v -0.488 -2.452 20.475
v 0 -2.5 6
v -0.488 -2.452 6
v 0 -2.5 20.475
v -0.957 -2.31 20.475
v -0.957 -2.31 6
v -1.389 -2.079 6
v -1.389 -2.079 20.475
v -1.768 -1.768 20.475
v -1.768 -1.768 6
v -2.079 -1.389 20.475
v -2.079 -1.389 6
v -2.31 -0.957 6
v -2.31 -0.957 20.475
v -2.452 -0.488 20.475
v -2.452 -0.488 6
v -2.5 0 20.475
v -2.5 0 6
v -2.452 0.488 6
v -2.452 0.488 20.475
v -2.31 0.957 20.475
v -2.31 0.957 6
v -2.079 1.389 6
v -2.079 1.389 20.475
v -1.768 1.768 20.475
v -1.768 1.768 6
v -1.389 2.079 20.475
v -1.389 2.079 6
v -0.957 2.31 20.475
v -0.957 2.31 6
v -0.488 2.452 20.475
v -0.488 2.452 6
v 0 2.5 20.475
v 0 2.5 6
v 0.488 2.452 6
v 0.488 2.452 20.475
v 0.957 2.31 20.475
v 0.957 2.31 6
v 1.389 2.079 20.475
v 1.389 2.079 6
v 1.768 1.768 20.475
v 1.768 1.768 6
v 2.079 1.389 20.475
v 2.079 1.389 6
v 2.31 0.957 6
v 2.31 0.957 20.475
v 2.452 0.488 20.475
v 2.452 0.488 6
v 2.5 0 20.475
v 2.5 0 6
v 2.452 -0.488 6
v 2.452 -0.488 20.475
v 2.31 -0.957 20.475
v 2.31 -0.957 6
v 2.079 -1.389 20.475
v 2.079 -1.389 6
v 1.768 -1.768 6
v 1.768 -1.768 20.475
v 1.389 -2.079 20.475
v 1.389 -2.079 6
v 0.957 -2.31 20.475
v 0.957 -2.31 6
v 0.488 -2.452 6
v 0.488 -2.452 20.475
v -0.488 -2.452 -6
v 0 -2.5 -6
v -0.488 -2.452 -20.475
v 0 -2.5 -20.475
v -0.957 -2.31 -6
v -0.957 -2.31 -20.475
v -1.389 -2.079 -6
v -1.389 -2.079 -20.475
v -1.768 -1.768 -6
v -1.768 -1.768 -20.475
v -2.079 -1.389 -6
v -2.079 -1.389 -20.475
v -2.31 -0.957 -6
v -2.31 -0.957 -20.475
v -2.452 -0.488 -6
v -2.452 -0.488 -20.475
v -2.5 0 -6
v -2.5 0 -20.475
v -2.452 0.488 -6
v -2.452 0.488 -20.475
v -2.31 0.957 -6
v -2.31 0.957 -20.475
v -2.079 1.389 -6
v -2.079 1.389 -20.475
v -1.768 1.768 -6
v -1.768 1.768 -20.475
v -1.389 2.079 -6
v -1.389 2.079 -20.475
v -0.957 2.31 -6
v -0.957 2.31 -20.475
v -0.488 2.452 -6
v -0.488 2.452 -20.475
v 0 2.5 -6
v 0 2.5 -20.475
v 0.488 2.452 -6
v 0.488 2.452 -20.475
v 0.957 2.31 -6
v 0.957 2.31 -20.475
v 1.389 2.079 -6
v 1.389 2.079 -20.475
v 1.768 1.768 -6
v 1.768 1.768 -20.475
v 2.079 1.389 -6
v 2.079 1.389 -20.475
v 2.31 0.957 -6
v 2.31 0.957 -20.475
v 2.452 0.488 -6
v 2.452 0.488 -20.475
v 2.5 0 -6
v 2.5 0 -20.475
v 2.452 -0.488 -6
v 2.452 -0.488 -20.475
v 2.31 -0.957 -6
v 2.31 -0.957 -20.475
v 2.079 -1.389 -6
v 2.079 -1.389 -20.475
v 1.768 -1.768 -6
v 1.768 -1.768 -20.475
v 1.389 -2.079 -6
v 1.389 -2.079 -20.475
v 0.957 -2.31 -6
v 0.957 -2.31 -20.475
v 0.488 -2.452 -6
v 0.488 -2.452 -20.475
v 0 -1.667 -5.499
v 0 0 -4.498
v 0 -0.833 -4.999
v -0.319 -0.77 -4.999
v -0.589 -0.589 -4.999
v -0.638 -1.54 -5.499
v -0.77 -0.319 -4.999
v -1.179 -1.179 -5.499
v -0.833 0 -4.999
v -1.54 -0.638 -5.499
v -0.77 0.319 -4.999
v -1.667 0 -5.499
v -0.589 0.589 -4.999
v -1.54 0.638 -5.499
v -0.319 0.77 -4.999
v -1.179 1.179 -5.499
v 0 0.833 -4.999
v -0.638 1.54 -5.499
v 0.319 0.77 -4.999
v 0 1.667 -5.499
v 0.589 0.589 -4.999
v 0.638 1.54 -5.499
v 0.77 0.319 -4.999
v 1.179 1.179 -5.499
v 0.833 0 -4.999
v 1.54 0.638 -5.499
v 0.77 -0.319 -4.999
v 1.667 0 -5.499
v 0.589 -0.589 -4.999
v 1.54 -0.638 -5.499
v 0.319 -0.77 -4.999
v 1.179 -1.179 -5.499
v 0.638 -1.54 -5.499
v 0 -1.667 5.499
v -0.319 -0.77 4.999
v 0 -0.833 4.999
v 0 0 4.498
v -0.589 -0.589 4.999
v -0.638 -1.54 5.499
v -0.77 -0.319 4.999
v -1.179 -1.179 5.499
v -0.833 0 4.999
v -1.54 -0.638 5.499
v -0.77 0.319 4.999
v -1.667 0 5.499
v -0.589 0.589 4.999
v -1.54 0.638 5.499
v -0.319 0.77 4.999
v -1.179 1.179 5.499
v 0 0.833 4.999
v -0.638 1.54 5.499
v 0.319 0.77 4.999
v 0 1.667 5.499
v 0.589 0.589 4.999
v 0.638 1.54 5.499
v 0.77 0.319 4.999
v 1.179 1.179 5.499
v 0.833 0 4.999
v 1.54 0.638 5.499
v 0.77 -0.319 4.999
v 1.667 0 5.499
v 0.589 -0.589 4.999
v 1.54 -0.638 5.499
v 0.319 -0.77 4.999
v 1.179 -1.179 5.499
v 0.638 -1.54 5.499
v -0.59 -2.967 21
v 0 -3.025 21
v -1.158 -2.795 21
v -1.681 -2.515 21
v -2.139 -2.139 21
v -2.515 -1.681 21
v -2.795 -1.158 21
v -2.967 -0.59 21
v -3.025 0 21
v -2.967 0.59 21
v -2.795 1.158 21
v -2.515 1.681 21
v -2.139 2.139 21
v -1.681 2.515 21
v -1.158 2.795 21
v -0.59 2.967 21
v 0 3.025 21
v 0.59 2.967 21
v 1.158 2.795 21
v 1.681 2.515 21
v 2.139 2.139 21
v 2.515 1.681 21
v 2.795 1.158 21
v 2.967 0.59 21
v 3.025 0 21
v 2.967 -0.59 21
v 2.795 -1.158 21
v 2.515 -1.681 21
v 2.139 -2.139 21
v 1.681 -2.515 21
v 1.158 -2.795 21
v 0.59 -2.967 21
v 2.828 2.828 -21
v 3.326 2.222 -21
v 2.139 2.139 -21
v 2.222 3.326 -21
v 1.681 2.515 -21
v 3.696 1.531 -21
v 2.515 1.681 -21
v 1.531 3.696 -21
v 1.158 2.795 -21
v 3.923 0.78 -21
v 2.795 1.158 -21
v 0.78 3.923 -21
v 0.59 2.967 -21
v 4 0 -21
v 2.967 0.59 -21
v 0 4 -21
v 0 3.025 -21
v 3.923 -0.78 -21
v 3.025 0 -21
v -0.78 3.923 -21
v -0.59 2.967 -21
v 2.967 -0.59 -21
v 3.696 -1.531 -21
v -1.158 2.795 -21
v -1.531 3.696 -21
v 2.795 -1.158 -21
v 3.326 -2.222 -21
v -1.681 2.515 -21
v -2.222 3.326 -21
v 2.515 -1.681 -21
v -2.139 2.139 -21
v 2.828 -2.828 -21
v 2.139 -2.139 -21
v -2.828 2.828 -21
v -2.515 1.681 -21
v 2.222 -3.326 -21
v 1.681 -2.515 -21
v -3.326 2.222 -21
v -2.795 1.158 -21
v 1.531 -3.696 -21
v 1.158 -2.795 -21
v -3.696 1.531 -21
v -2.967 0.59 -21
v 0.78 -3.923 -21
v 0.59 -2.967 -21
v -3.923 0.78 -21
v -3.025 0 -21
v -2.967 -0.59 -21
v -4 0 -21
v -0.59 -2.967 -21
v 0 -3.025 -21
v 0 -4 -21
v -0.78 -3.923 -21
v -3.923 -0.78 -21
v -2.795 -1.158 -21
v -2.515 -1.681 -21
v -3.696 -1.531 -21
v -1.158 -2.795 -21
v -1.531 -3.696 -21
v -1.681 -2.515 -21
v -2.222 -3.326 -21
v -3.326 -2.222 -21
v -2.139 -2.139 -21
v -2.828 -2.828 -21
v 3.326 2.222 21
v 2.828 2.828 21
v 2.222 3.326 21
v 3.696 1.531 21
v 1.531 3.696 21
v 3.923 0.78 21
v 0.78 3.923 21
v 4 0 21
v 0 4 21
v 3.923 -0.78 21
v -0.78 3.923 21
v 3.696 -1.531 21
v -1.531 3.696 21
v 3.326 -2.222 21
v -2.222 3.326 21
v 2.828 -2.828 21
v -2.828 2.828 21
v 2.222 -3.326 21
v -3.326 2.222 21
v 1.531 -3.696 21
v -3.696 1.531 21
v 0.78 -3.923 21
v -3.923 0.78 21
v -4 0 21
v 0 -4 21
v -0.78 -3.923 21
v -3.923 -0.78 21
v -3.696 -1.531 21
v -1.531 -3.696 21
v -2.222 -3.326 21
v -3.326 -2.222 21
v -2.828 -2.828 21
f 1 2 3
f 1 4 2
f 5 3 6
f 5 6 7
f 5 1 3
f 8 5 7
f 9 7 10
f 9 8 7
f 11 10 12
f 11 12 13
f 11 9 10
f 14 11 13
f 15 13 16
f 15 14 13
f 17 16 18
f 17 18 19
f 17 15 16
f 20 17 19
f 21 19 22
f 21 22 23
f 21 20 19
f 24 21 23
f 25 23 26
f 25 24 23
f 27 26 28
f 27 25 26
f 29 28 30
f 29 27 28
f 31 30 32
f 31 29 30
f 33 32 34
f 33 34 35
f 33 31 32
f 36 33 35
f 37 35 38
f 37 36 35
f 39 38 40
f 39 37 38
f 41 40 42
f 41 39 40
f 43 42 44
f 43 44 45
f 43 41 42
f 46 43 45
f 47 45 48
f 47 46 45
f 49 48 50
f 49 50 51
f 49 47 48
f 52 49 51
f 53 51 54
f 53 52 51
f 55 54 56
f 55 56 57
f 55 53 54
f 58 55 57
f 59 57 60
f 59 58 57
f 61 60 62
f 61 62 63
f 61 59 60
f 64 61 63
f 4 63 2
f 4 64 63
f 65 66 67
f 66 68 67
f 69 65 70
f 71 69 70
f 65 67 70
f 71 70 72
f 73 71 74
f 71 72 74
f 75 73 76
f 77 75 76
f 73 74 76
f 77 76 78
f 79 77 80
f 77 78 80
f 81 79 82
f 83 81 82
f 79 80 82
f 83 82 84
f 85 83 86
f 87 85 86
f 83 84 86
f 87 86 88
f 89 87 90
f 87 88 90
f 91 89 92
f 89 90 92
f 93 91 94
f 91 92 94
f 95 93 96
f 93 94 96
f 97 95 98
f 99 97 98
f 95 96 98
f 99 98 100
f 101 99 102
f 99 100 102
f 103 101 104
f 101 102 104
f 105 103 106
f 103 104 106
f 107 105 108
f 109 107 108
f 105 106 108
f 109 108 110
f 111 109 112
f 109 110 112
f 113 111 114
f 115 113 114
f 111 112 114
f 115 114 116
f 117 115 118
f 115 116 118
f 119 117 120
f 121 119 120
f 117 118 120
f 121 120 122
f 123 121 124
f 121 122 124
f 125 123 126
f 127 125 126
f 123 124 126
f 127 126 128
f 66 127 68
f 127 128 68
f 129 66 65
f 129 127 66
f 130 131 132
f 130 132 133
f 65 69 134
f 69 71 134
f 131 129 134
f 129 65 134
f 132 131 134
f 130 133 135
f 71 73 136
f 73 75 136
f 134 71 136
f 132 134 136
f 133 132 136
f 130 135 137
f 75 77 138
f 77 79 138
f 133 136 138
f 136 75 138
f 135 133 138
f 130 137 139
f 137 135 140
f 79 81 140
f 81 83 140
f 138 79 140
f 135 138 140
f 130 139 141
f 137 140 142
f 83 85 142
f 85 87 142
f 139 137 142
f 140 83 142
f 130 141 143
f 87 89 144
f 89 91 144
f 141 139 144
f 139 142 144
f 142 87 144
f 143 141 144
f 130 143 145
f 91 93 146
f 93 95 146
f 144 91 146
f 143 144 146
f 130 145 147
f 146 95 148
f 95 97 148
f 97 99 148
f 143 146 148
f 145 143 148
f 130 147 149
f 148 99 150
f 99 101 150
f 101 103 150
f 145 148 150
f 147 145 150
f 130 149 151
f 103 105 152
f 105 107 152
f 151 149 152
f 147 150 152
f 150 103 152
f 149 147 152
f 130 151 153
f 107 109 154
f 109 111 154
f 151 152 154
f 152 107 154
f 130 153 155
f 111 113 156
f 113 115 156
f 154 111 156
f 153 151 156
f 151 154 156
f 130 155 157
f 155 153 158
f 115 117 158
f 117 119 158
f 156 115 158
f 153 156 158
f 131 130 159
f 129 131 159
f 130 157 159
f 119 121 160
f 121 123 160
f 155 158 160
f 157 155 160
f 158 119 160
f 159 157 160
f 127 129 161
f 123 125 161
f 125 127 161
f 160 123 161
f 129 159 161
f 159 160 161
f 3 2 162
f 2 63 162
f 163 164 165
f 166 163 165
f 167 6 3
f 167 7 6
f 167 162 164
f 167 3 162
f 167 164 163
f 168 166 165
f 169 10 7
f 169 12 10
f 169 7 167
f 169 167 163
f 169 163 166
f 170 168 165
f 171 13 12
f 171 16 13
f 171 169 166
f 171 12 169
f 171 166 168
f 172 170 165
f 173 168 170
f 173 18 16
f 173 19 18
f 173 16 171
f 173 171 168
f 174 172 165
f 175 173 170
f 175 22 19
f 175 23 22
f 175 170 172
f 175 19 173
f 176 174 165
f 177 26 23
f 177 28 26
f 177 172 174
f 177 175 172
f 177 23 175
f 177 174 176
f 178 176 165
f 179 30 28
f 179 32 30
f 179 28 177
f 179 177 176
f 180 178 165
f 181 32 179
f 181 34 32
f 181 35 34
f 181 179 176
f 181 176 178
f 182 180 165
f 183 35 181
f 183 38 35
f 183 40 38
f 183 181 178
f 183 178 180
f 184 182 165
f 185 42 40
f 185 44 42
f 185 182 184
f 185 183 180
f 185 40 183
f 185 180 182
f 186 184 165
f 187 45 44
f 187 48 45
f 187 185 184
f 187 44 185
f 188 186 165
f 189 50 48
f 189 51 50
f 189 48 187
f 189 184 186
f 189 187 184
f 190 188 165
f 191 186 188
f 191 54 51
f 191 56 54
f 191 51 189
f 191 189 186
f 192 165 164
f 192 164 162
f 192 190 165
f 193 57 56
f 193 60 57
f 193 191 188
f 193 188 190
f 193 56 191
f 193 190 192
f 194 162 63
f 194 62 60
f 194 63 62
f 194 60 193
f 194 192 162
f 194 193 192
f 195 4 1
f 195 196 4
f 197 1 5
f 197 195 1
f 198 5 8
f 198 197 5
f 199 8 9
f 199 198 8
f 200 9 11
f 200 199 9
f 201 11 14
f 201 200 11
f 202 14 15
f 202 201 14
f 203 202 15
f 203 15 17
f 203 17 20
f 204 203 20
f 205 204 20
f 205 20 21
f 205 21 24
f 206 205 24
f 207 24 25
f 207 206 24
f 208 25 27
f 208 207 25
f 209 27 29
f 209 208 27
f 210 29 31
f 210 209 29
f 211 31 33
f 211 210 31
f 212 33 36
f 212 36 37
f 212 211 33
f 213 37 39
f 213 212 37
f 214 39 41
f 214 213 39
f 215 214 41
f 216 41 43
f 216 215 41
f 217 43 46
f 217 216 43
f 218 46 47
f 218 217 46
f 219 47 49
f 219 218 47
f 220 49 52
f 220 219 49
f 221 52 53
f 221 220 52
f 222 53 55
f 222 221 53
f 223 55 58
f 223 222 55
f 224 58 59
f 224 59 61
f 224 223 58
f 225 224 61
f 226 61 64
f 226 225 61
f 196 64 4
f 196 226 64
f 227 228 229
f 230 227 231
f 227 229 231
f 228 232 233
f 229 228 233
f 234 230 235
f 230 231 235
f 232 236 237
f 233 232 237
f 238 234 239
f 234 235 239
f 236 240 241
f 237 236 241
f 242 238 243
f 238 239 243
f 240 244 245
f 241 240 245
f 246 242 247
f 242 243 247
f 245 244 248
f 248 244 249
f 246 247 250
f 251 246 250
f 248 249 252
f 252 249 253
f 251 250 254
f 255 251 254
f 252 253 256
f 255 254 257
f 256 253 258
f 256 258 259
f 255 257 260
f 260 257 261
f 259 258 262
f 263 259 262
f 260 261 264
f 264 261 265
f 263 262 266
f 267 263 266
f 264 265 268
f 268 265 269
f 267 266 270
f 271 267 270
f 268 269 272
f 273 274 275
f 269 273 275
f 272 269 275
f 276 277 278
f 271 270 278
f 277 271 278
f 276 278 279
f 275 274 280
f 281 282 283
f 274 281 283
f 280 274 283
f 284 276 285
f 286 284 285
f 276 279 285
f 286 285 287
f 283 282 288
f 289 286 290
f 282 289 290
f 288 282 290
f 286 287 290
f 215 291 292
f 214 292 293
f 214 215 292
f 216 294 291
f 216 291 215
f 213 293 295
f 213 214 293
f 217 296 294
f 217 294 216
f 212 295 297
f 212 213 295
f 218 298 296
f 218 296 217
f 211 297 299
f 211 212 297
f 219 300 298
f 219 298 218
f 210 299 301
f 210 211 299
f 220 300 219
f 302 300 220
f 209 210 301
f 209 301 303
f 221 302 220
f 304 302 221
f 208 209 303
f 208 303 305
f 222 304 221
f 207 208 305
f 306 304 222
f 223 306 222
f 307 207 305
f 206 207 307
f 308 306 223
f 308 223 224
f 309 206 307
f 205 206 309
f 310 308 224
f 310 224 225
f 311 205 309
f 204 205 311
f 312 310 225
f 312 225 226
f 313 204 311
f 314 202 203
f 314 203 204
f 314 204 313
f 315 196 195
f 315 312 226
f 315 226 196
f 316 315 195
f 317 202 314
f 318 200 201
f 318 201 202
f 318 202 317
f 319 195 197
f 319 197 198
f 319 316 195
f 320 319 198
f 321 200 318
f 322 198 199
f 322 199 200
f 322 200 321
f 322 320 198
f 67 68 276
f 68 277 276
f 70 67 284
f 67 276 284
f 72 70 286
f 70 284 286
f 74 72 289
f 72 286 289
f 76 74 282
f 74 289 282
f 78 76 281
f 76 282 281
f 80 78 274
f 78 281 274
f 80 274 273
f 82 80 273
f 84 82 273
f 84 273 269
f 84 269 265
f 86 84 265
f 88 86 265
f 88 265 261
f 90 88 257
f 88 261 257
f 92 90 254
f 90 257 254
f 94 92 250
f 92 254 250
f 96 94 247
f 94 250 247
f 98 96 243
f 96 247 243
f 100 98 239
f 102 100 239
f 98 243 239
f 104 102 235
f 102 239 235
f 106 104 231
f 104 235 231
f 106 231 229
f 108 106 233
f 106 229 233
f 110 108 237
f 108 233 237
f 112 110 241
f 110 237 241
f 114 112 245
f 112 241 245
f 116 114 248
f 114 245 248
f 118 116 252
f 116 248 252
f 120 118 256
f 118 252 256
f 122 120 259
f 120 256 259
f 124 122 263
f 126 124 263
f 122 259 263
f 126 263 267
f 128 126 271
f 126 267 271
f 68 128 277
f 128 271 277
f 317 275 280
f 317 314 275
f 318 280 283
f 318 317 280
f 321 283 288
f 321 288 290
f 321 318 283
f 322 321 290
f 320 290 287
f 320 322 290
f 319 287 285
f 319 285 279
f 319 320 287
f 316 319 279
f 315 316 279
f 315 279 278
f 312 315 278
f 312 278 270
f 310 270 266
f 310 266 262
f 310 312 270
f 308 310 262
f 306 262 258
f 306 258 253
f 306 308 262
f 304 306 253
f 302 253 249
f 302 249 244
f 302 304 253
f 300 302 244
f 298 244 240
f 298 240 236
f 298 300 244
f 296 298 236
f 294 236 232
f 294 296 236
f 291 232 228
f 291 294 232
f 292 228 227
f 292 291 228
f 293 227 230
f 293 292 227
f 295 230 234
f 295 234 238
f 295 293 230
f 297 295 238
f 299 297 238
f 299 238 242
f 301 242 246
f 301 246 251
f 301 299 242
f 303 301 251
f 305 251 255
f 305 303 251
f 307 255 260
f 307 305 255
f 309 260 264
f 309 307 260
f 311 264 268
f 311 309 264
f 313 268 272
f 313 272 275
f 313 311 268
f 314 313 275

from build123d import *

# Parameters (mm, degrees)
ESBO_O1_R                = 4
RESSALTO_EXTRUS_O1_DEPTH = 21


with BuildPart() as part:
    # Esboço1 → Ressalto-extrusão1 (new, symmetric)
    with BuildSketch(Plane.XY):
        with Locations(Location((0, 0, 0), (0, 0, 180))):
            Circle(ESBO_O1_R)
    extrude(amount=RESSALTO_EXTRUS_O1_DEPTH, both=True)

    # Esboço3 → Furo roscado de M61 (revolve, cut)
    with BuildSketch(Plane(origin=(0, 0, 21), x_dir=(0, -1, 0), z_dir=(1, 0, 0))):
        Polygon((0, 0), (0, 16.502151548), (2.5, 15), (2.5, 0.525), (3.025, 0), align=None)
    furo_roscado_de_m61 = revolve(axis=Axis((0, 0, 27.35), (0, 0, -1)), mode=Mode.SUBTRACT)

    # Espelhar2: Furo roscado de M61 across plane
    add(furo_roscado_de_m61.mirror(Plane.XY), mode=Mode.SUBTRACT)


solid = part.part
